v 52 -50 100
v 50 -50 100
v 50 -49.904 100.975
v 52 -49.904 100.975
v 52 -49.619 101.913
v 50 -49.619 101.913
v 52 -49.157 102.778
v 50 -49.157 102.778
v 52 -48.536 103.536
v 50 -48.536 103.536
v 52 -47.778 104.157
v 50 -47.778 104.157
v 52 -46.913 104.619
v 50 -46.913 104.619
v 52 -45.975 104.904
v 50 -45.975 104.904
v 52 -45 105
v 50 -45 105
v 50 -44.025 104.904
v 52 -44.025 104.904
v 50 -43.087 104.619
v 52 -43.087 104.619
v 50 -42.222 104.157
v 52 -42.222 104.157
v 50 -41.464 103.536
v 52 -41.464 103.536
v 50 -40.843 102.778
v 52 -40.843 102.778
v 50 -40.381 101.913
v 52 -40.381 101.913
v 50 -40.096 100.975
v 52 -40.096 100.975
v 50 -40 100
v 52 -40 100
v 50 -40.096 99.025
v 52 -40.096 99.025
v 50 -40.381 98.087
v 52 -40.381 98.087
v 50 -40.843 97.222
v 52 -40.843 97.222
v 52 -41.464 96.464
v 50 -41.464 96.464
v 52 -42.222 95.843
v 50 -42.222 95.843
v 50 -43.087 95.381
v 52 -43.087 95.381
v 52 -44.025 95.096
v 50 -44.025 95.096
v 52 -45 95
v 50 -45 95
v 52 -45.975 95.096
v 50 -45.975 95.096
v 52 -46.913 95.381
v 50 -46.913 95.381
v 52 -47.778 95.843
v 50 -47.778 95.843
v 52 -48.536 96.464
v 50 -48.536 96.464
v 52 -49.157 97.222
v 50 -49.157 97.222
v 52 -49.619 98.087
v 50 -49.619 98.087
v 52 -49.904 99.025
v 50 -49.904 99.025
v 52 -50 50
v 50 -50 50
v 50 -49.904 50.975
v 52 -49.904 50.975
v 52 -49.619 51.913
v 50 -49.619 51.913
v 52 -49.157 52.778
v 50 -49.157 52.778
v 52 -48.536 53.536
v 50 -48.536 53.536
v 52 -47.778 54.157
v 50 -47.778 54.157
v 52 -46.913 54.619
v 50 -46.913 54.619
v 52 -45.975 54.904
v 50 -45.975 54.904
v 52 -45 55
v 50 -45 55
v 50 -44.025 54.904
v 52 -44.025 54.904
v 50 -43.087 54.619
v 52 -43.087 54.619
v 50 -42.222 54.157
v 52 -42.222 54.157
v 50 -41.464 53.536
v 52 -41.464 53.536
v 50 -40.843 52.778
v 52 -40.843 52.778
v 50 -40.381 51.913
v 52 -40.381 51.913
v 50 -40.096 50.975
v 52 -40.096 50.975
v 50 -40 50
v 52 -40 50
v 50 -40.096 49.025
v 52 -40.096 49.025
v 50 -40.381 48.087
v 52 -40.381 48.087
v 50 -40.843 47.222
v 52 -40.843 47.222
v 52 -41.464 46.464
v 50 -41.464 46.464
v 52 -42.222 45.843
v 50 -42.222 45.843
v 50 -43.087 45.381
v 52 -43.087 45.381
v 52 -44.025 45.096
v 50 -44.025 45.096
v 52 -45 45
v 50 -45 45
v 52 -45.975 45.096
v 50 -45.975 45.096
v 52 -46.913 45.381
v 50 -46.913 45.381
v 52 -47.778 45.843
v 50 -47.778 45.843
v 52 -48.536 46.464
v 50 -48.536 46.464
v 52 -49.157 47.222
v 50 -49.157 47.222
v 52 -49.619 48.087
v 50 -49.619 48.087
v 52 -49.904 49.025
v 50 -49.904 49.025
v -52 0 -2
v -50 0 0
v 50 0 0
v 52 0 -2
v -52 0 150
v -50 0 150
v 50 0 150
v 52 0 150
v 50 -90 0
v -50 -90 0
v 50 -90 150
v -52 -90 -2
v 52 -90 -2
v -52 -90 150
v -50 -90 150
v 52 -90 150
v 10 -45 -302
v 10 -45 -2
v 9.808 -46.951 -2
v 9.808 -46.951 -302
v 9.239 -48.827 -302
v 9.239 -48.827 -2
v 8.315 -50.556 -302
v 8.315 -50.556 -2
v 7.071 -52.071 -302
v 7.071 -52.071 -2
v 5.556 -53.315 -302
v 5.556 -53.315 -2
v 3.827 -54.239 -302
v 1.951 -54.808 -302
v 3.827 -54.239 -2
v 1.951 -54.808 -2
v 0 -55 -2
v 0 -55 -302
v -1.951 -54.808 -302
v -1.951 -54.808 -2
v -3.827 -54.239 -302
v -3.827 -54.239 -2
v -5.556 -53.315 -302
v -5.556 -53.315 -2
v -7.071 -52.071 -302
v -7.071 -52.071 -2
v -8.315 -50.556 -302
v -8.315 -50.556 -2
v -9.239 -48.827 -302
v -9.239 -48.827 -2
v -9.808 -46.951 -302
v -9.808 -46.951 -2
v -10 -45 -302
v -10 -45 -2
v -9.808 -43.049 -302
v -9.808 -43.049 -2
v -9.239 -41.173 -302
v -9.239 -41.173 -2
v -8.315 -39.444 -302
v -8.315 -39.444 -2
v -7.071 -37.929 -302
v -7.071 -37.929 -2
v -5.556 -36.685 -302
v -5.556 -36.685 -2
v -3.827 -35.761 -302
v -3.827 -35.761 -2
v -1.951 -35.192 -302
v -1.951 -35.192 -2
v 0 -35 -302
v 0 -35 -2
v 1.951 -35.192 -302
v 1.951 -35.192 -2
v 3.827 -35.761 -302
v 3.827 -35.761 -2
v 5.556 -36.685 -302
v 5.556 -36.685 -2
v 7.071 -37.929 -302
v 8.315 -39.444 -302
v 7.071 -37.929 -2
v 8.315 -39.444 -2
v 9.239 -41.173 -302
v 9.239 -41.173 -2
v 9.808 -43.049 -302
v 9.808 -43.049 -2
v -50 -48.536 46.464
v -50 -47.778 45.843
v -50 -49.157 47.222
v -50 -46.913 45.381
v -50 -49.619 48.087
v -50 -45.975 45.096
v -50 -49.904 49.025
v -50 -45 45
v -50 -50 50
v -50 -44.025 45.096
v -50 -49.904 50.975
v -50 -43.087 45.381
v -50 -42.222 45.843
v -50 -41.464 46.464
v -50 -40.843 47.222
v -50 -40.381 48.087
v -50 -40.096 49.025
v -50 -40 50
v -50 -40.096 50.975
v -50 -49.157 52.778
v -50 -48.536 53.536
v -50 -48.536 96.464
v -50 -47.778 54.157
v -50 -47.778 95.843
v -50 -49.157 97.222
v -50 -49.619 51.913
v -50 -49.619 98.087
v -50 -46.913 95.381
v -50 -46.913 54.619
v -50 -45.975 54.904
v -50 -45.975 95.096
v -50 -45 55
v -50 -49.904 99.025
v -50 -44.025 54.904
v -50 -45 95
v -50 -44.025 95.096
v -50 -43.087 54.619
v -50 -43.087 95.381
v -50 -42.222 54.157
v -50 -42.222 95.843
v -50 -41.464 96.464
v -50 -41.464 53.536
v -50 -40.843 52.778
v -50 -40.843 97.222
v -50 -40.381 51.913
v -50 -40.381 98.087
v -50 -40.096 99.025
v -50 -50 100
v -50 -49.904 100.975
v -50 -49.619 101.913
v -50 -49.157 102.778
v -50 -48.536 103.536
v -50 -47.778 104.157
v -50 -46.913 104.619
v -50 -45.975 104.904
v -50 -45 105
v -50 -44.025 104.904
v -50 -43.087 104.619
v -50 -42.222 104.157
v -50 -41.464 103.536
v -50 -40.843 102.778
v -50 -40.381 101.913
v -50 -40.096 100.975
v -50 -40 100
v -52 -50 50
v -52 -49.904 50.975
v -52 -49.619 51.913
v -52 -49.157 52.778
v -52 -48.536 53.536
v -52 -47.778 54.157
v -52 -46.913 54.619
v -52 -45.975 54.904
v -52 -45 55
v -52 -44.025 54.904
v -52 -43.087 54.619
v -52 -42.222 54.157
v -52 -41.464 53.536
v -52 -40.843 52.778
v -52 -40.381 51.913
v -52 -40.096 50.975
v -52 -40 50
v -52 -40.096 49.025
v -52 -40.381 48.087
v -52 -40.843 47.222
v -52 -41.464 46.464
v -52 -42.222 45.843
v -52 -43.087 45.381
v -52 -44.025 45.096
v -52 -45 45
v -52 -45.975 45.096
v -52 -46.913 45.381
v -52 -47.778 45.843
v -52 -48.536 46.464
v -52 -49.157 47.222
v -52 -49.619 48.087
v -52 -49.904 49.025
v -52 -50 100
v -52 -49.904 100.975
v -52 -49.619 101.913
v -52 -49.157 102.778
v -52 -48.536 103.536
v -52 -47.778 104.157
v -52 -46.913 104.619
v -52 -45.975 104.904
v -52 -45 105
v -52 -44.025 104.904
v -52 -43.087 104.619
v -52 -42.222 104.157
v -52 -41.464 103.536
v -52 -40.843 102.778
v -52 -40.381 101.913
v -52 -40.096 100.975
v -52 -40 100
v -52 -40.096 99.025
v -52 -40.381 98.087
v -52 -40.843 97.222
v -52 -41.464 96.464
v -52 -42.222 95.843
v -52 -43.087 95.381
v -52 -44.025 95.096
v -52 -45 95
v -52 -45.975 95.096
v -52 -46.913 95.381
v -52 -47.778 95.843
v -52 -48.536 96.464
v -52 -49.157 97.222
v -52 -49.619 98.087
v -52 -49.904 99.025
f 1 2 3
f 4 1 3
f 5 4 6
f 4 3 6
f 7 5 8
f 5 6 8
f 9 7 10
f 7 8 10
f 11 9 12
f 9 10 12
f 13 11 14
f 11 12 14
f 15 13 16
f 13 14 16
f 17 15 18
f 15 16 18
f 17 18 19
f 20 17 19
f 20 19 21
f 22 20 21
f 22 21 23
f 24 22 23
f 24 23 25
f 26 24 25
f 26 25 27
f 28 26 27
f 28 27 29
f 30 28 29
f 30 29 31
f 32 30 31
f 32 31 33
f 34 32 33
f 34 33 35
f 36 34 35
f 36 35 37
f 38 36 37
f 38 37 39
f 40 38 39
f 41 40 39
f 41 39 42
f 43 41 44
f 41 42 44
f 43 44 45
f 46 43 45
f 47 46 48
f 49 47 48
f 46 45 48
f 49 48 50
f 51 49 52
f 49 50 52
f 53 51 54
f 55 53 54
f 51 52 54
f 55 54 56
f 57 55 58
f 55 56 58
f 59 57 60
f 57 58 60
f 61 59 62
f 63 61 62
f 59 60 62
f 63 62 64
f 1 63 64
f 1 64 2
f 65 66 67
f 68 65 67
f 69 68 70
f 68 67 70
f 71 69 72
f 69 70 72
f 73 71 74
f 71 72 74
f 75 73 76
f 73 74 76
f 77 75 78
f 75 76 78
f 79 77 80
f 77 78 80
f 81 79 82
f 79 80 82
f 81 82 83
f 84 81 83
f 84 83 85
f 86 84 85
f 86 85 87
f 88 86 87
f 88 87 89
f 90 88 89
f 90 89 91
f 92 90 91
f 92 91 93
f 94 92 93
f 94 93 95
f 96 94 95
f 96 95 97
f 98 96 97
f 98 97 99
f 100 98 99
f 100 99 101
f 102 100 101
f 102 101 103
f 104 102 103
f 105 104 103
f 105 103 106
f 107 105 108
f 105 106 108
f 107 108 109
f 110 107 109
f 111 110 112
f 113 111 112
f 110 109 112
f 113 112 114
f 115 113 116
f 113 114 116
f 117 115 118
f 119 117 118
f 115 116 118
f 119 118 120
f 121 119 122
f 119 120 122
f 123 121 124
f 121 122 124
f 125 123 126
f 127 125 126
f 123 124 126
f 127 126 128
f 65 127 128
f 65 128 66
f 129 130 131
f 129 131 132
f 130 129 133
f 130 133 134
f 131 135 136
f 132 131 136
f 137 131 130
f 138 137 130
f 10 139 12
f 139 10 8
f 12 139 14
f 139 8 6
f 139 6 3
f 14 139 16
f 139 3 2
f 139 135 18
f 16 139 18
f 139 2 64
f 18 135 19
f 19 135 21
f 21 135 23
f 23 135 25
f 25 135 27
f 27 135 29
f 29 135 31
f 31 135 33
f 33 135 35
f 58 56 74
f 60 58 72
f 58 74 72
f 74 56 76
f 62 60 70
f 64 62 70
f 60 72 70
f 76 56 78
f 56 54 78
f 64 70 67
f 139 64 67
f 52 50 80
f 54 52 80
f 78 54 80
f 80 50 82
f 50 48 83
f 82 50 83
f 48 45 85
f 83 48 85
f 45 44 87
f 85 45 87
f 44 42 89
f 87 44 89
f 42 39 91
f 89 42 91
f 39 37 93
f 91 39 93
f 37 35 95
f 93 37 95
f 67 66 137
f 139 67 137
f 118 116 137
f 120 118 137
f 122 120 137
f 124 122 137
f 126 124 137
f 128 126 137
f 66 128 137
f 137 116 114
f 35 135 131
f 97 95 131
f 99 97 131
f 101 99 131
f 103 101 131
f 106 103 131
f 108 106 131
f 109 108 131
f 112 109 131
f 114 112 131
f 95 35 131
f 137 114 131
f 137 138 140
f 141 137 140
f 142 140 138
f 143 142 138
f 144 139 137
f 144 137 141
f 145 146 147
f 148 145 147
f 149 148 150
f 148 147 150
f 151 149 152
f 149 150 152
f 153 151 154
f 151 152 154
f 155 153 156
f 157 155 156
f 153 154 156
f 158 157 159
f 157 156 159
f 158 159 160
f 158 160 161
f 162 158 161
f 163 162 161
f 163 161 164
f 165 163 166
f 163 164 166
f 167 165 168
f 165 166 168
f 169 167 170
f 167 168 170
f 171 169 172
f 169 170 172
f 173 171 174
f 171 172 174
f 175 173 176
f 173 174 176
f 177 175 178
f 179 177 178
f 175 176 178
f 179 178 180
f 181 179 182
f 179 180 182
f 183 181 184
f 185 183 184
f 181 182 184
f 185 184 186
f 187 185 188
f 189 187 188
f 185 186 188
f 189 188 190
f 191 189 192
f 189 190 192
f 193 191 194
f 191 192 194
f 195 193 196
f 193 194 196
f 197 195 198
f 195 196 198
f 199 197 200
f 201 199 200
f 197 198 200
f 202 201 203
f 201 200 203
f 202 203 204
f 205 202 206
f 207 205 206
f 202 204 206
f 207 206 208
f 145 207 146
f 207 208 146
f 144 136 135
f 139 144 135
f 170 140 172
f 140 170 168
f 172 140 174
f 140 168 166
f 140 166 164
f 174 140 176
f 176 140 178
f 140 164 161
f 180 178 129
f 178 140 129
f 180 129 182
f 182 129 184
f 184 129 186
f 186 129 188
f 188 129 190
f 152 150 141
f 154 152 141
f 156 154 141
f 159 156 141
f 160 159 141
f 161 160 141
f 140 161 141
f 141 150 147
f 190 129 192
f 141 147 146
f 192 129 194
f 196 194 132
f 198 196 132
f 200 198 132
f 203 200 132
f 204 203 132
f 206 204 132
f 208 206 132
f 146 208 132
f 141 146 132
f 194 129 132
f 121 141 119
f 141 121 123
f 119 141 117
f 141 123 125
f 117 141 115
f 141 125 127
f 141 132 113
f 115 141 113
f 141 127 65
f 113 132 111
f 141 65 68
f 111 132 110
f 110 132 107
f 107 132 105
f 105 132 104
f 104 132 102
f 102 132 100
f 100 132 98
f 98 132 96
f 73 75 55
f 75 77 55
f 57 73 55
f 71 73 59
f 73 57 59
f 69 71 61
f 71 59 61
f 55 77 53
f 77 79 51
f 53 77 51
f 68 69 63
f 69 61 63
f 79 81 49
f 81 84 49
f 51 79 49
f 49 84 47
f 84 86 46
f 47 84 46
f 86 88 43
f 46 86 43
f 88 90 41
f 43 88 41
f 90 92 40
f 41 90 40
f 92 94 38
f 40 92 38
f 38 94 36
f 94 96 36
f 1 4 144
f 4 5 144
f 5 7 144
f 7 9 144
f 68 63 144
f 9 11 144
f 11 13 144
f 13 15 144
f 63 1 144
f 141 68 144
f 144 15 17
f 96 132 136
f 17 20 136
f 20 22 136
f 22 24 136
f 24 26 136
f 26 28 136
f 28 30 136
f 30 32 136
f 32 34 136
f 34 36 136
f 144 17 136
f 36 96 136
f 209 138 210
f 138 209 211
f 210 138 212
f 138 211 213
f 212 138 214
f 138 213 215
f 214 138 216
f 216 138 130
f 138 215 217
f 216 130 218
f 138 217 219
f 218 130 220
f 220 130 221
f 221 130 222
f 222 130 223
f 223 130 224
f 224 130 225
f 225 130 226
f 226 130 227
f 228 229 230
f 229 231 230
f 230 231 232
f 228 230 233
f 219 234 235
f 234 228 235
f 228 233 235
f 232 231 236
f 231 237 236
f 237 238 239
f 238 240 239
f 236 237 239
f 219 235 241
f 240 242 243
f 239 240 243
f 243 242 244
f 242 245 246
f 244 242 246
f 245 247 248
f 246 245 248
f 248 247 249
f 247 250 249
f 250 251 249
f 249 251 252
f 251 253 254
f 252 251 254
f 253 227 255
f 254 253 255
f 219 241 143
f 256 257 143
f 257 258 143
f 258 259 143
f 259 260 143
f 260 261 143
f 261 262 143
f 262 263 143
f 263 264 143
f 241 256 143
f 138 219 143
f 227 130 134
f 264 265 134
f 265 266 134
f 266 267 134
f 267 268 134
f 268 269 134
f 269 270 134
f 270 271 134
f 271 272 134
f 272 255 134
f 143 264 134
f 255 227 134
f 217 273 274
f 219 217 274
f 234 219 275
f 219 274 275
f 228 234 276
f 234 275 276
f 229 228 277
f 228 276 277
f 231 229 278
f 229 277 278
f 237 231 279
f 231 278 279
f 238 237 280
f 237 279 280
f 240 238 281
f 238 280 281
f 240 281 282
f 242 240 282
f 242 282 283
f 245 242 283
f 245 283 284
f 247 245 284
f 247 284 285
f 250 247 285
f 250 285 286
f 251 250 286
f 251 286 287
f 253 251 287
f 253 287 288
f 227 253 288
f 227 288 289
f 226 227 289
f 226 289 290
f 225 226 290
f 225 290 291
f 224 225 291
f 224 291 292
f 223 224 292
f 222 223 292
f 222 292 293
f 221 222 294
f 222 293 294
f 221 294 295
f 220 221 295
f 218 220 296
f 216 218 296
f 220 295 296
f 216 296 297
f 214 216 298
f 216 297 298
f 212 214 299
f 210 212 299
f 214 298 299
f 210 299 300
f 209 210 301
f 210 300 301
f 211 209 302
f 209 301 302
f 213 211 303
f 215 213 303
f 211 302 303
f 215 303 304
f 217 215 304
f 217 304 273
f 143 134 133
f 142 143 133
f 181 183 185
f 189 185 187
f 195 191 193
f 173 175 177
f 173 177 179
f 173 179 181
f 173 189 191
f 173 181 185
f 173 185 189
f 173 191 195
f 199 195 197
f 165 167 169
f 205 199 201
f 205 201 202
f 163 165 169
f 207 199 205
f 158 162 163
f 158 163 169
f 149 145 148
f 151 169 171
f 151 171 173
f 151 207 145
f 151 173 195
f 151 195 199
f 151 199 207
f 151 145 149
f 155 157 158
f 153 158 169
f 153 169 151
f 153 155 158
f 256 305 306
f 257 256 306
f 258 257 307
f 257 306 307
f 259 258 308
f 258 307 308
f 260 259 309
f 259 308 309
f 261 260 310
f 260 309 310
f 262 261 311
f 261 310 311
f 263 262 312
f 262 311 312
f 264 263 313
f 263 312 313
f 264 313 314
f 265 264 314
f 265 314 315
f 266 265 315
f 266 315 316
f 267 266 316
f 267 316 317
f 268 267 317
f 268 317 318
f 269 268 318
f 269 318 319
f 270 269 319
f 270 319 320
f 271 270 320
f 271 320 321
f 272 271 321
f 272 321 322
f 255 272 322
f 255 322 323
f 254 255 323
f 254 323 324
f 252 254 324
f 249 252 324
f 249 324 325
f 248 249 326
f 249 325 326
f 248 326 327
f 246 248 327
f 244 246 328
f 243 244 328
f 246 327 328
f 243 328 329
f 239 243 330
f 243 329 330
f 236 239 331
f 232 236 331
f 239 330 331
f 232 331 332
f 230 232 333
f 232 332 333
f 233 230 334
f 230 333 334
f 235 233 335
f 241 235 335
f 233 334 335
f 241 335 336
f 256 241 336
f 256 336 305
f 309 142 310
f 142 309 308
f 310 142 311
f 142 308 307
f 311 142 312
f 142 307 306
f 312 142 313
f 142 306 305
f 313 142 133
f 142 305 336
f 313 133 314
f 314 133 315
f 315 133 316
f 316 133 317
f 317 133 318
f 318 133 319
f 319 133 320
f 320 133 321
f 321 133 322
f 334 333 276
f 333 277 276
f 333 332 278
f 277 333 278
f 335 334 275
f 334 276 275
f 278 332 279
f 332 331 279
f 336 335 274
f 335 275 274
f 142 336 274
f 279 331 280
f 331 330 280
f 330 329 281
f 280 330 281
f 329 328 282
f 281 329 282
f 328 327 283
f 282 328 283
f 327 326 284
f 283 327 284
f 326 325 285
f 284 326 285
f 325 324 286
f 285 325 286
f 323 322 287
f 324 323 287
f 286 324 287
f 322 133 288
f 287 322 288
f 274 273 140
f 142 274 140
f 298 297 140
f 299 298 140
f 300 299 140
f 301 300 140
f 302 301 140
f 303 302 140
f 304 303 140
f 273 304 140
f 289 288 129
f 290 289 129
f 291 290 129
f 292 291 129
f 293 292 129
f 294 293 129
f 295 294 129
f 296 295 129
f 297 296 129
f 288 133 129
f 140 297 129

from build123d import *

# Parameters (mm, degrees)
F1_DEPTH = 90
F2_R     = 10
F3_DEPTH = 300
F4_R     = 5
F5_DEPTH = 104.001


with BuildPart() as f1:
    # F0 (on Front) → F1 (new body)
    with BuildSketch(Plane.XZ):
        Polygon((50, 0), (0, 0), (-50, 0), (-50, 150), (-52, 150), (-52, -2), (52, -2), (52, 150), (50, 150), align=None)
    extrude(amount=F1_DEPTH)

    # F2 (on face) → F3 (join)
    with BuildSketch(Plane(origin=(0, 0, -2), x_dir=(1, 0, 0), z_dir=(0, 0, -1))):
        with Locations((0, 45)):
            Circle(F2_R)
    extrude(amount=F3_DEPTH)

    # F4 (on face) → F5 (cut, through all)
    with BuildSketch(Plane(origin=(-52, 0, 0), x_dir=(0, -1, 0), z_dir=(-1, 0, 0))):
        with Locations((45, 100)):
            Circle(F4_R)
        with Locations((45, 50)):
            Circle(F4_R)
    extrude(amount=-F5_DEPTH, mode=Mode.SUBTRACT)


solid = f1.part
